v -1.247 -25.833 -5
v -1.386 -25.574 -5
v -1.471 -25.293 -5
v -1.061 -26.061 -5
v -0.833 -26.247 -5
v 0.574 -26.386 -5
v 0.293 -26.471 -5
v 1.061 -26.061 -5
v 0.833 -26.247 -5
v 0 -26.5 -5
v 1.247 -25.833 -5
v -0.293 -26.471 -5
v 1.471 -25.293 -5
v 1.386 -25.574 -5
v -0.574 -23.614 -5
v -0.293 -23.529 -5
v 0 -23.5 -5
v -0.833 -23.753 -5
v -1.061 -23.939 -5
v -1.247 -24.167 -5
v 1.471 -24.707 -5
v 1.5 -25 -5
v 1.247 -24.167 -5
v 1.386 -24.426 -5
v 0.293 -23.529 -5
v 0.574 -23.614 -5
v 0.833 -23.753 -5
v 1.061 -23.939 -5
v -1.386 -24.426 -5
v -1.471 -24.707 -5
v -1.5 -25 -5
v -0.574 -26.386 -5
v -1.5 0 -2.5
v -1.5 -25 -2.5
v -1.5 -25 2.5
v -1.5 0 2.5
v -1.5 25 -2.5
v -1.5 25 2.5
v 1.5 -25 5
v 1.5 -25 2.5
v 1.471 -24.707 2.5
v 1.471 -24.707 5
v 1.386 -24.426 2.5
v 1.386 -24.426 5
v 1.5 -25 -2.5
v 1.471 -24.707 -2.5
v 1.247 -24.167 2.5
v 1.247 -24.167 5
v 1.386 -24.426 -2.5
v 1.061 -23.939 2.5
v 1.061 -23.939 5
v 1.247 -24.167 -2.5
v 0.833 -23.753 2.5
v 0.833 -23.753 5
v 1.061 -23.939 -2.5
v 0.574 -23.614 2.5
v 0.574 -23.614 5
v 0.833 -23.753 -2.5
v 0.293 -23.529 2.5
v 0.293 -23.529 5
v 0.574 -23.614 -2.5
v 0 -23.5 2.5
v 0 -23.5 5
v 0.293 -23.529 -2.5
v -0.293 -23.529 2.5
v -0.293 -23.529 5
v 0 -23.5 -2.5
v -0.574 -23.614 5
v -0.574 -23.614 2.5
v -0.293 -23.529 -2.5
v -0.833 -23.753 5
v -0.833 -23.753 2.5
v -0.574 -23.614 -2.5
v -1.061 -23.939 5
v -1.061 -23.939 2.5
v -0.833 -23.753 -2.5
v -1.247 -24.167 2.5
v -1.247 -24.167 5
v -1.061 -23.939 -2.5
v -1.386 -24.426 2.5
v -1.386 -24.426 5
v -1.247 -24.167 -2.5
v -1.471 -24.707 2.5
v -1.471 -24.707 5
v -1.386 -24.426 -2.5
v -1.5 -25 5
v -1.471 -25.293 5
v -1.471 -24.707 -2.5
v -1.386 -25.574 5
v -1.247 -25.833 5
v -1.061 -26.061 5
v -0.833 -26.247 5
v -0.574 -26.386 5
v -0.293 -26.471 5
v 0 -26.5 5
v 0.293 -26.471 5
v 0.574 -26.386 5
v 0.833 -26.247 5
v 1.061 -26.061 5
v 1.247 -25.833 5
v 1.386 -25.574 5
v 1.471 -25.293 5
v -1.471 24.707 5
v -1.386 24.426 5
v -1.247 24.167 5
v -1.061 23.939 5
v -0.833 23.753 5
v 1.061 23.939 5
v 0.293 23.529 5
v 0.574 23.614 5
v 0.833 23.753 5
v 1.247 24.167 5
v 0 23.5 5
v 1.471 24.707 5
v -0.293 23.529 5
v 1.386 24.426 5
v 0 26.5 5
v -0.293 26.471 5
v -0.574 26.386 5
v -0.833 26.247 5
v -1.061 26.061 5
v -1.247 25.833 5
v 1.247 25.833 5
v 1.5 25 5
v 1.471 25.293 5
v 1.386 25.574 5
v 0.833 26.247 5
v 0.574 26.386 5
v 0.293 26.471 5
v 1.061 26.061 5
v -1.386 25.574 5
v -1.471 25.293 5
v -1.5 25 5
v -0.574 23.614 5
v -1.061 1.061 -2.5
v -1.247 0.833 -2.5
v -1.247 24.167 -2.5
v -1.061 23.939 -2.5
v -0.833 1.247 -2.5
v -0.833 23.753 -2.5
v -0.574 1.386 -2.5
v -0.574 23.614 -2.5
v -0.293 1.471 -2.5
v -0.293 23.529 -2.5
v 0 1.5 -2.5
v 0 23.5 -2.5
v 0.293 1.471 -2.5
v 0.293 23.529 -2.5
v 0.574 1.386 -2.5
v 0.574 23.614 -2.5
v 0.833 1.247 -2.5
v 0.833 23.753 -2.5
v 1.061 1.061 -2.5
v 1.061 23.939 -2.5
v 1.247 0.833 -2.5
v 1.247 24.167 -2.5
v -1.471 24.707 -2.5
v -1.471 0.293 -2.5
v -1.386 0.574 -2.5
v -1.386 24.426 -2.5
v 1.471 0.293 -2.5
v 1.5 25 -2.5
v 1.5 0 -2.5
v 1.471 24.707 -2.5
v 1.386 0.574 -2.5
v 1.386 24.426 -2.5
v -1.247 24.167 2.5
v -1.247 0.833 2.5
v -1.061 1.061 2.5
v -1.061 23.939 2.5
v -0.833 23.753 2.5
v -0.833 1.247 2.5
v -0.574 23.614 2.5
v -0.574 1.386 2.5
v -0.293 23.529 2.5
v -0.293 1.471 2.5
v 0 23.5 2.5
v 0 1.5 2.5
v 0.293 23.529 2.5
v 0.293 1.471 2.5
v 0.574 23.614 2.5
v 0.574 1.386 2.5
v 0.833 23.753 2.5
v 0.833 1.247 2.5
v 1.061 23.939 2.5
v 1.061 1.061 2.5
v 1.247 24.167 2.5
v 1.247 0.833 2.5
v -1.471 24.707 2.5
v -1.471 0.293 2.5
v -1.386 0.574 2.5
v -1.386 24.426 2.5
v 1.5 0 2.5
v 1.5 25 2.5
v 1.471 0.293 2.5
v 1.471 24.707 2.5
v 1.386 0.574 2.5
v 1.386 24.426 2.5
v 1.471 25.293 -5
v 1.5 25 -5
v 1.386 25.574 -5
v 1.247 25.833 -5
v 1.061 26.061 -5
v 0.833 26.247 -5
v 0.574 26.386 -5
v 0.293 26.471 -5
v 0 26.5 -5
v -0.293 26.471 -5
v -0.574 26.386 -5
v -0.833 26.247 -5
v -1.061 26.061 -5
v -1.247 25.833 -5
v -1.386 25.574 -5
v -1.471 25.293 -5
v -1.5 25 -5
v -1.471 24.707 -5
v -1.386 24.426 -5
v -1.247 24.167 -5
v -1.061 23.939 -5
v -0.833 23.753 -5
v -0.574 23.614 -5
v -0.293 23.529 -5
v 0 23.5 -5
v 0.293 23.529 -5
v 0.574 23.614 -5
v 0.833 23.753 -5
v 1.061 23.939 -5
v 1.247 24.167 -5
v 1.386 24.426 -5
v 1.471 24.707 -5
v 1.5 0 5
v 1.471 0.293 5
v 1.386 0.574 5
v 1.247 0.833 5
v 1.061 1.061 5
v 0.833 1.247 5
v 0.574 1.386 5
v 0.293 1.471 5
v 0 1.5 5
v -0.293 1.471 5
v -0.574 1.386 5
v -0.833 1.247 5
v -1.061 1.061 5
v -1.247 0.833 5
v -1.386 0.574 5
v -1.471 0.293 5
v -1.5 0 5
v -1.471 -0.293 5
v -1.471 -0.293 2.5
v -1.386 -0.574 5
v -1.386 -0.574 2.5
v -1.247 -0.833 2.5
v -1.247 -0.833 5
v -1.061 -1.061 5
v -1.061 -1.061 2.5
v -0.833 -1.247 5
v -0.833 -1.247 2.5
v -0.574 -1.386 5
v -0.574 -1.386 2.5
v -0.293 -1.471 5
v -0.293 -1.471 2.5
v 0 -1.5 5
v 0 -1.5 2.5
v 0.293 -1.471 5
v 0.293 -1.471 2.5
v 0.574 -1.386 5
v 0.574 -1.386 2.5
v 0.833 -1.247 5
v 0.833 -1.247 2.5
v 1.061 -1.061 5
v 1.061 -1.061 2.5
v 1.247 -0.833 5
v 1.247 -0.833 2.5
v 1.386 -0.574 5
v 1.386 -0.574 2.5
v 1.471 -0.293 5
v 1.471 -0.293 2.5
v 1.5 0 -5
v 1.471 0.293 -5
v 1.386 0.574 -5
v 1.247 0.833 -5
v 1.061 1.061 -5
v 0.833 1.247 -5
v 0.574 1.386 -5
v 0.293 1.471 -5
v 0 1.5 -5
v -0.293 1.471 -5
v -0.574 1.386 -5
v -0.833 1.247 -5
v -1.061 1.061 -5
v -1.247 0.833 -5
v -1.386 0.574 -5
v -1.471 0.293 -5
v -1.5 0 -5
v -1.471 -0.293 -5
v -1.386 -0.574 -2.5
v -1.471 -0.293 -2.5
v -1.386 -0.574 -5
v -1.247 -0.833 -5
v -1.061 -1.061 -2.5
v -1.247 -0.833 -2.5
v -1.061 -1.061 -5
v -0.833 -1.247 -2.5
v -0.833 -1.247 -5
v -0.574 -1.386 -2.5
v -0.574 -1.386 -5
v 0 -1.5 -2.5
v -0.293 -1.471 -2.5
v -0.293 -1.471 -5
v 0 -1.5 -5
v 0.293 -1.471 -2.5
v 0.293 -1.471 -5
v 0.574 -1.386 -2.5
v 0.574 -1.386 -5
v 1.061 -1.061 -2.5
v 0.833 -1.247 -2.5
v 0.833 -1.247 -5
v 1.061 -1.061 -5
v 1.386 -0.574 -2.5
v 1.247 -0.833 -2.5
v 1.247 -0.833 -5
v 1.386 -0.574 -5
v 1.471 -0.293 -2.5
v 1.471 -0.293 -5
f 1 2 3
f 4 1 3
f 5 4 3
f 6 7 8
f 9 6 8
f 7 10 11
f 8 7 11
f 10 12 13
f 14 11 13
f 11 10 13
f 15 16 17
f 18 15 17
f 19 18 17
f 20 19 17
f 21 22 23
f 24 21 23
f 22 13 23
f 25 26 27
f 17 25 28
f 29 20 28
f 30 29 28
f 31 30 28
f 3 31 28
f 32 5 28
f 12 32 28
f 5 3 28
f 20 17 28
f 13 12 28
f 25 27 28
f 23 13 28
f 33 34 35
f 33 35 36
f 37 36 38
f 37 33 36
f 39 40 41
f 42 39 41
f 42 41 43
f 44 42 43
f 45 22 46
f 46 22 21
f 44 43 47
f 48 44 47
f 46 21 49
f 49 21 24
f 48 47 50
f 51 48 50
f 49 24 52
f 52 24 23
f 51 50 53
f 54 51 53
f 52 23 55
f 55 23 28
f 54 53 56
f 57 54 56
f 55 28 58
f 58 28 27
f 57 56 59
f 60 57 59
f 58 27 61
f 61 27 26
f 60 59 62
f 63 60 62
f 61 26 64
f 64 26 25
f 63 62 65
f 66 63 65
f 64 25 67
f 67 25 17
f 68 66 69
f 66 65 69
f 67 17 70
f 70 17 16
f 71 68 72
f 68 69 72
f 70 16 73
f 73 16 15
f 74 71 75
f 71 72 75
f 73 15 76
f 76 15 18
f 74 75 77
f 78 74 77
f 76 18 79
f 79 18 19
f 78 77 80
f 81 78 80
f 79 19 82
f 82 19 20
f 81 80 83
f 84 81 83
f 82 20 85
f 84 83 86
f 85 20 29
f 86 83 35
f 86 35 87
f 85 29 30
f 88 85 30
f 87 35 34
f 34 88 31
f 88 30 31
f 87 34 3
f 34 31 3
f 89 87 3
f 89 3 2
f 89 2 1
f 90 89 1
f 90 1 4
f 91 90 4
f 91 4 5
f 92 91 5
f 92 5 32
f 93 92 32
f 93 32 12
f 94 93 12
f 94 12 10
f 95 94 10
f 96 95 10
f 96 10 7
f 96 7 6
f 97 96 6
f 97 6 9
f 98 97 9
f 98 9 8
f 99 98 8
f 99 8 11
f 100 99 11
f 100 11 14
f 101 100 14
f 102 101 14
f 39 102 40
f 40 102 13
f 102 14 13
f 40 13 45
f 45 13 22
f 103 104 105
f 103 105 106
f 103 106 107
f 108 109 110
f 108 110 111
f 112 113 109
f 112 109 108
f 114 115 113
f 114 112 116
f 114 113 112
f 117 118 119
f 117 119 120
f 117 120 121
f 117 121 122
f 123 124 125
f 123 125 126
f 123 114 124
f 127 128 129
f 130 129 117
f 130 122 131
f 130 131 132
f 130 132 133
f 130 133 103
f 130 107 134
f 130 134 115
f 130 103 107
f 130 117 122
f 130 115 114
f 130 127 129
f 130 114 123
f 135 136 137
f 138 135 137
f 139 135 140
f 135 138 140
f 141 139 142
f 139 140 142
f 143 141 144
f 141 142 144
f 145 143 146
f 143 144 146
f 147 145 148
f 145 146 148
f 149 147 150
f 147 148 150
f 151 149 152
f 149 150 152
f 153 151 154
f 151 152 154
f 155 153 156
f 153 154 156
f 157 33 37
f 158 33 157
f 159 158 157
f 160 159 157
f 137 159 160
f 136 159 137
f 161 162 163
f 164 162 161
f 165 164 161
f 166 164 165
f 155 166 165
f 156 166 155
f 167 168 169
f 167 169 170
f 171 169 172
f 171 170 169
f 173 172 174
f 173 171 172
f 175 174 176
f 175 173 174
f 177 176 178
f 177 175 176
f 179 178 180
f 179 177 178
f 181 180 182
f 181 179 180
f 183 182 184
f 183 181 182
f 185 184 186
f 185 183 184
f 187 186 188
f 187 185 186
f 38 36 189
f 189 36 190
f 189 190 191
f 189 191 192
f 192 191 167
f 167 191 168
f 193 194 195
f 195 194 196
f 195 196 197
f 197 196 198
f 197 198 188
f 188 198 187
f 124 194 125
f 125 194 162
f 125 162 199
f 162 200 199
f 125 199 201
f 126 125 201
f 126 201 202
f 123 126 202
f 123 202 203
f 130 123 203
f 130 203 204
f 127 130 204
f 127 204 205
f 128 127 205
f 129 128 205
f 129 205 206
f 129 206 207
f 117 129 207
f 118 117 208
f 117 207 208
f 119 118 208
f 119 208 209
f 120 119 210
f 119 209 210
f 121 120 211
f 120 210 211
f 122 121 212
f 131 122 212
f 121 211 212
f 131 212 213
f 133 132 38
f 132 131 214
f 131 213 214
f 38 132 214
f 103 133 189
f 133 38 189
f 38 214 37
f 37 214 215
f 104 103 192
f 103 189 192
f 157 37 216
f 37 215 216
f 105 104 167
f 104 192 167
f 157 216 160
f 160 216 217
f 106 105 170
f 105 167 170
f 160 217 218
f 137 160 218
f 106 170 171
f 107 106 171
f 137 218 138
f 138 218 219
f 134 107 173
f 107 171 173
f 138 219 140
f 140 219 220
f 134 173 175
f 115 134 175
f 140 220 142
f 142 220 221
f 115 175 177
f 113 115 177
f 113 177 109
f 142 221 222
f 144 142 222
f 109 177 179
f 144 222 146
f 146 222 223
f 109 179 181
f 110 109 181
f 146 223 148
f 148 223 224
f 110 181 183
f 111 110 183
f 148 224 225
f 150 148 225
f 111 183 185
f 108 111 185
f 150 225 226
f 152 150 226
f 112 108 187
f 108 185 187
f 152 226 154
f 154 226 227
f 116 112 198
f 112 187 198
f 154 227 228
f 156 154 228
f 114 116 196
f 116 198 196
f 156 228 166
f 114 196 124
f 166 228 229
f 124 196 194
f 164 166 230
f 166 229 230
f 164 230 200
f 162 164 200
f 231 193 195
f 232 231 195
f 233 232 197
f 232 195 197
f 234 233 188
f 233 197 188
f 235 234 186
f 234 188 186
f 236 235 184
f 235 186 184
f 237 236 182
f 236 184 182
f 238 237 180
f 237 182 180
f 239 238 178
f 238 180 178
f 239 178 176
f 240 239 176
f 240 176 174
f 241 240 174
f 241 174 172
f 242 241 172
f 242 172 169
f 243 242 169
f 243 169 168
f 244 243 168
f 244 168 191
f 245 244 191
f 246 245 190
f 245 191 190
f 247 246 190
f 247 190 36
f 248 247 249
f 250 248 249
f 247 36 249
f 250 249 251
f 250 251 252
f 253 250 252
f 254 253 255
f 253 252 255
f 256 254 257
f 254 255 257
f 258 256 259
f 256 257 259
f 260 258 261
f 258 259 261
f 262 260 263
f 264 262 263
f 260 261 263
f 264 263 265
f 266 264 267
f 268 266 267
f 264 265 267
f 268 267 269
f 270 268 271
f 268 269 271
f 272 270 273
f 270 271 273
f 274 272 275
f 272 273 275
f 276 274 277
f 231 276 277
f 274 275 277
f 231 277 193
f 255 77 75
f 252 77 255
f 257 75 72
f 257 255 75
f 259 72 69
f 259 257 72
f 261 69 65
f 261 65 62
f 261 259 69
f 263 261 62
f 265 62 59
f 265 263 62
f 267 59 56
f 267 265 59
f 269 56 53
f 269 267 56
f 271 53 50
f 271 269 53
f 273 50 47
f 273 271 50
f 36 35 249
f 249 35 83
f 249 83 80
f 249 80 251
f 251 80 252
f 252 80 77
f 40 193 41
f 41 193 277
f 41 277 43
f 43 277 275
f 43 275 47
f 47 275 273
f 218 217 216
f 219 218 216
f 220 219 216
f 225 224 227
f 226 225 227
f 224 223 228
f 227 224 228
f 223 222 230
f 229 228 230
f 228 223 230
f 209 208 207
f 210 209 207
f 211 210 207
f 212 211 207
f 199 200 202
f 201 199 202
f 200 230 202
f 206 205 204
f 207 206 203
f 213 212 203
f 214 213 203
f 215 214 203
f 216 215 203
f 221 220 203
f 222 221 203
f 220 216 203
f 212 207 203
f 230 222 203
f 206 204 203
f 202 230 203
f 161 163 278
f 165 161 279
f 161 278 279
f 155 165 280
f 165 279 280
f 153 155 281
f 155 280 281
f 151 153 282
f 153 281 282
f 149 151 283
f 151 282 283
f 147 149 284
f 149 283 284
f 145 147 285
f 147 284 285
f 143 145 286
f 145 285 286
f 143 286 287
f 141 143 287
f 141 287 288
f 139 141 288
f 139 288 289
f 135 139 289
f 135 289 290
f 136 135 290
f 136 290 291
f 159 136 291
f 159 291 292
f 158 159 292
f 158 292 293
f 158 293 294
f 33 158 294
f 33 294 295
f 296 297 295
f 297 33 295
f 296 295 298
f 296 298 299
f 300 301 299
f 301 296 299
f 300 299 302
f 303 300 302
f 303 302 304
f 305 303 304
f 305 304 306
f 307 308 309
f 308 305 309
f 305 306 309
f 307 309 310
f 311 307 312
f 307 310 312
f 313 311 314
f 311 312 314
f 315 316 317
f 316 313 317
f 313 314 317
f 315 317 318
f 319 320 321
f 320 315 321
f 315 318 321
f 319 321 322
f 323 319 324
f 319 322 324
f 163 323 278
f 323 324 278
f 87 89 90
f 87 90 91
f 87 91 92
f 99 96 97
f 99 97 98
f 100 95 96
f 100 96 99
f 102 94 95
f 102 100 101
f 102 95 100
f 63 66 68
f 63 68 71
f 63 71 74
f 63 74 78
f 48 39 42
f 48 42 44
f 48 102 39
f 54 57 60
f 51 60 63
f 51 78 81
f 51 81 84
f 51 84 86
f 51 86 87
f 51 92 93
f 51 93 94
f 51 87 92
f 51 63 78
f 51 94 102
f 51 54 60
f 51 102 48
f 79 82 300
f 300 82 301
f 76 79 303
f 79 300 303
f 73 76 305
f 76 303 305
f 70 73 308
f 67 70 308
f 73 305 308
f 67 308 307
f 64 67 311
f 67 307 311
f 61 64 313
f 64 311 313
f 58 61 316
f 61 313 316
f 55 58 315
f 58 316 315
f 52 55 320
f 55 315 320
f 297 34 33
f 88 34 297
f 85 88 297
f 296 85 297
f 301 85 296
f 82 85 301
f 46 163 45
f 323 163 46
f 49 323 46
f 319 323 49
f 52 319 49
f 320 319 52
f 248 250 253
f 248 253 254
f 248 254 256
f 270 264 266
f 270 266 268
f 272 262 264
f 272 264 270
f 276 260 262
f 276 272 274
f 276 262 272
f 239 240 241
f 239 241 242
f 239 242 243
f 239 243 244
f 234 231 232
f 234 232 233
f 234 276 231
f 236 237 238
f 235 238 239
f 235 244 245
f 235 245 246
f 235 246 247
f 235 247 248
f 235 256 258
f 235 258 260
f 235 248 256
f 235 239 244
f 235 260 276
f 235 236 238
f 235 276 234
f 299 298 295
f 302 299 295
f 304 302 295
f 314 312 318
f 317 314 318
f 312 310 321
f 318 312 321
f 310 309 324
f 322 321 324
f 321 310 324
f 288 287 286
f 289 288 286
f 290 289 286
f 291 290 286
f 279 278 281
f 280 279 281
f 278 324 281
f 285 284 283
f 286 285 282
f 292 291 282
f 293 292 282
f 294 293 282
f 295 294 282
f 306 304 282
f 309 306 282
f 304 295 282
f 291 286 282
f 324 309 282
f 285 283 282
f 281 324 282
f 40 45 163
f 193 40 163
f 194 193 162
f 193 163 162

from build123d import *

# Parameters (mm, degrees)
SALIENTE_EXTRUIR1_DEPTH      = 2.5
SALIENTE_EXTRUIR1_DEPTH_BACK = 2.5
CROQUIS1_W                   = 3
CROQUIS1_H                   = 50
SALIENTE_EXTRUIR2_DEPTH      = 5
SALIENTE_EXTRUIR2_DEPTH_BACK = 5
CROQUIS1_3_R                 = 1.5


with BuildPart() as part:
    # Croquis1 → Saliente-Extruir1 (new, two sides: drawn at the far end of the back side and taken through both)
    with BuildSketch(Plane.XY.offset(-SALIENTE_EXTRUIR1_DEPTH_BACK)):
        Rectangle(CROQUIS1_W, CROQUIS1_H)
    extrude(amount=SALIENTE_EXTRUIR1_DEPTH + SALIENTE_EXTRUIR1_DEPTH_BACK)

    # Croquis1<3> → Saliente-Extruir2 (add, two sides: drawn at the far end of the back side and taken through both)
    with BuildSketch(Plane.XY.offset(-SALIENTE_EXTRUIR2_DEPTH_BACK)):
        with Locations((0, 25)):
            Circle(CROQUIS1_3_R)
        with Locations((0, -25)):
            Circle(CROQUIS1_3_R)
        Circle(CROQUIS1_3_R)
    extrude(amount=SALIENTE_EXTRUIR2_DEPTH + SALIENTE_EXTRUIR2_DEPTH_BACK)


solid = part.part
